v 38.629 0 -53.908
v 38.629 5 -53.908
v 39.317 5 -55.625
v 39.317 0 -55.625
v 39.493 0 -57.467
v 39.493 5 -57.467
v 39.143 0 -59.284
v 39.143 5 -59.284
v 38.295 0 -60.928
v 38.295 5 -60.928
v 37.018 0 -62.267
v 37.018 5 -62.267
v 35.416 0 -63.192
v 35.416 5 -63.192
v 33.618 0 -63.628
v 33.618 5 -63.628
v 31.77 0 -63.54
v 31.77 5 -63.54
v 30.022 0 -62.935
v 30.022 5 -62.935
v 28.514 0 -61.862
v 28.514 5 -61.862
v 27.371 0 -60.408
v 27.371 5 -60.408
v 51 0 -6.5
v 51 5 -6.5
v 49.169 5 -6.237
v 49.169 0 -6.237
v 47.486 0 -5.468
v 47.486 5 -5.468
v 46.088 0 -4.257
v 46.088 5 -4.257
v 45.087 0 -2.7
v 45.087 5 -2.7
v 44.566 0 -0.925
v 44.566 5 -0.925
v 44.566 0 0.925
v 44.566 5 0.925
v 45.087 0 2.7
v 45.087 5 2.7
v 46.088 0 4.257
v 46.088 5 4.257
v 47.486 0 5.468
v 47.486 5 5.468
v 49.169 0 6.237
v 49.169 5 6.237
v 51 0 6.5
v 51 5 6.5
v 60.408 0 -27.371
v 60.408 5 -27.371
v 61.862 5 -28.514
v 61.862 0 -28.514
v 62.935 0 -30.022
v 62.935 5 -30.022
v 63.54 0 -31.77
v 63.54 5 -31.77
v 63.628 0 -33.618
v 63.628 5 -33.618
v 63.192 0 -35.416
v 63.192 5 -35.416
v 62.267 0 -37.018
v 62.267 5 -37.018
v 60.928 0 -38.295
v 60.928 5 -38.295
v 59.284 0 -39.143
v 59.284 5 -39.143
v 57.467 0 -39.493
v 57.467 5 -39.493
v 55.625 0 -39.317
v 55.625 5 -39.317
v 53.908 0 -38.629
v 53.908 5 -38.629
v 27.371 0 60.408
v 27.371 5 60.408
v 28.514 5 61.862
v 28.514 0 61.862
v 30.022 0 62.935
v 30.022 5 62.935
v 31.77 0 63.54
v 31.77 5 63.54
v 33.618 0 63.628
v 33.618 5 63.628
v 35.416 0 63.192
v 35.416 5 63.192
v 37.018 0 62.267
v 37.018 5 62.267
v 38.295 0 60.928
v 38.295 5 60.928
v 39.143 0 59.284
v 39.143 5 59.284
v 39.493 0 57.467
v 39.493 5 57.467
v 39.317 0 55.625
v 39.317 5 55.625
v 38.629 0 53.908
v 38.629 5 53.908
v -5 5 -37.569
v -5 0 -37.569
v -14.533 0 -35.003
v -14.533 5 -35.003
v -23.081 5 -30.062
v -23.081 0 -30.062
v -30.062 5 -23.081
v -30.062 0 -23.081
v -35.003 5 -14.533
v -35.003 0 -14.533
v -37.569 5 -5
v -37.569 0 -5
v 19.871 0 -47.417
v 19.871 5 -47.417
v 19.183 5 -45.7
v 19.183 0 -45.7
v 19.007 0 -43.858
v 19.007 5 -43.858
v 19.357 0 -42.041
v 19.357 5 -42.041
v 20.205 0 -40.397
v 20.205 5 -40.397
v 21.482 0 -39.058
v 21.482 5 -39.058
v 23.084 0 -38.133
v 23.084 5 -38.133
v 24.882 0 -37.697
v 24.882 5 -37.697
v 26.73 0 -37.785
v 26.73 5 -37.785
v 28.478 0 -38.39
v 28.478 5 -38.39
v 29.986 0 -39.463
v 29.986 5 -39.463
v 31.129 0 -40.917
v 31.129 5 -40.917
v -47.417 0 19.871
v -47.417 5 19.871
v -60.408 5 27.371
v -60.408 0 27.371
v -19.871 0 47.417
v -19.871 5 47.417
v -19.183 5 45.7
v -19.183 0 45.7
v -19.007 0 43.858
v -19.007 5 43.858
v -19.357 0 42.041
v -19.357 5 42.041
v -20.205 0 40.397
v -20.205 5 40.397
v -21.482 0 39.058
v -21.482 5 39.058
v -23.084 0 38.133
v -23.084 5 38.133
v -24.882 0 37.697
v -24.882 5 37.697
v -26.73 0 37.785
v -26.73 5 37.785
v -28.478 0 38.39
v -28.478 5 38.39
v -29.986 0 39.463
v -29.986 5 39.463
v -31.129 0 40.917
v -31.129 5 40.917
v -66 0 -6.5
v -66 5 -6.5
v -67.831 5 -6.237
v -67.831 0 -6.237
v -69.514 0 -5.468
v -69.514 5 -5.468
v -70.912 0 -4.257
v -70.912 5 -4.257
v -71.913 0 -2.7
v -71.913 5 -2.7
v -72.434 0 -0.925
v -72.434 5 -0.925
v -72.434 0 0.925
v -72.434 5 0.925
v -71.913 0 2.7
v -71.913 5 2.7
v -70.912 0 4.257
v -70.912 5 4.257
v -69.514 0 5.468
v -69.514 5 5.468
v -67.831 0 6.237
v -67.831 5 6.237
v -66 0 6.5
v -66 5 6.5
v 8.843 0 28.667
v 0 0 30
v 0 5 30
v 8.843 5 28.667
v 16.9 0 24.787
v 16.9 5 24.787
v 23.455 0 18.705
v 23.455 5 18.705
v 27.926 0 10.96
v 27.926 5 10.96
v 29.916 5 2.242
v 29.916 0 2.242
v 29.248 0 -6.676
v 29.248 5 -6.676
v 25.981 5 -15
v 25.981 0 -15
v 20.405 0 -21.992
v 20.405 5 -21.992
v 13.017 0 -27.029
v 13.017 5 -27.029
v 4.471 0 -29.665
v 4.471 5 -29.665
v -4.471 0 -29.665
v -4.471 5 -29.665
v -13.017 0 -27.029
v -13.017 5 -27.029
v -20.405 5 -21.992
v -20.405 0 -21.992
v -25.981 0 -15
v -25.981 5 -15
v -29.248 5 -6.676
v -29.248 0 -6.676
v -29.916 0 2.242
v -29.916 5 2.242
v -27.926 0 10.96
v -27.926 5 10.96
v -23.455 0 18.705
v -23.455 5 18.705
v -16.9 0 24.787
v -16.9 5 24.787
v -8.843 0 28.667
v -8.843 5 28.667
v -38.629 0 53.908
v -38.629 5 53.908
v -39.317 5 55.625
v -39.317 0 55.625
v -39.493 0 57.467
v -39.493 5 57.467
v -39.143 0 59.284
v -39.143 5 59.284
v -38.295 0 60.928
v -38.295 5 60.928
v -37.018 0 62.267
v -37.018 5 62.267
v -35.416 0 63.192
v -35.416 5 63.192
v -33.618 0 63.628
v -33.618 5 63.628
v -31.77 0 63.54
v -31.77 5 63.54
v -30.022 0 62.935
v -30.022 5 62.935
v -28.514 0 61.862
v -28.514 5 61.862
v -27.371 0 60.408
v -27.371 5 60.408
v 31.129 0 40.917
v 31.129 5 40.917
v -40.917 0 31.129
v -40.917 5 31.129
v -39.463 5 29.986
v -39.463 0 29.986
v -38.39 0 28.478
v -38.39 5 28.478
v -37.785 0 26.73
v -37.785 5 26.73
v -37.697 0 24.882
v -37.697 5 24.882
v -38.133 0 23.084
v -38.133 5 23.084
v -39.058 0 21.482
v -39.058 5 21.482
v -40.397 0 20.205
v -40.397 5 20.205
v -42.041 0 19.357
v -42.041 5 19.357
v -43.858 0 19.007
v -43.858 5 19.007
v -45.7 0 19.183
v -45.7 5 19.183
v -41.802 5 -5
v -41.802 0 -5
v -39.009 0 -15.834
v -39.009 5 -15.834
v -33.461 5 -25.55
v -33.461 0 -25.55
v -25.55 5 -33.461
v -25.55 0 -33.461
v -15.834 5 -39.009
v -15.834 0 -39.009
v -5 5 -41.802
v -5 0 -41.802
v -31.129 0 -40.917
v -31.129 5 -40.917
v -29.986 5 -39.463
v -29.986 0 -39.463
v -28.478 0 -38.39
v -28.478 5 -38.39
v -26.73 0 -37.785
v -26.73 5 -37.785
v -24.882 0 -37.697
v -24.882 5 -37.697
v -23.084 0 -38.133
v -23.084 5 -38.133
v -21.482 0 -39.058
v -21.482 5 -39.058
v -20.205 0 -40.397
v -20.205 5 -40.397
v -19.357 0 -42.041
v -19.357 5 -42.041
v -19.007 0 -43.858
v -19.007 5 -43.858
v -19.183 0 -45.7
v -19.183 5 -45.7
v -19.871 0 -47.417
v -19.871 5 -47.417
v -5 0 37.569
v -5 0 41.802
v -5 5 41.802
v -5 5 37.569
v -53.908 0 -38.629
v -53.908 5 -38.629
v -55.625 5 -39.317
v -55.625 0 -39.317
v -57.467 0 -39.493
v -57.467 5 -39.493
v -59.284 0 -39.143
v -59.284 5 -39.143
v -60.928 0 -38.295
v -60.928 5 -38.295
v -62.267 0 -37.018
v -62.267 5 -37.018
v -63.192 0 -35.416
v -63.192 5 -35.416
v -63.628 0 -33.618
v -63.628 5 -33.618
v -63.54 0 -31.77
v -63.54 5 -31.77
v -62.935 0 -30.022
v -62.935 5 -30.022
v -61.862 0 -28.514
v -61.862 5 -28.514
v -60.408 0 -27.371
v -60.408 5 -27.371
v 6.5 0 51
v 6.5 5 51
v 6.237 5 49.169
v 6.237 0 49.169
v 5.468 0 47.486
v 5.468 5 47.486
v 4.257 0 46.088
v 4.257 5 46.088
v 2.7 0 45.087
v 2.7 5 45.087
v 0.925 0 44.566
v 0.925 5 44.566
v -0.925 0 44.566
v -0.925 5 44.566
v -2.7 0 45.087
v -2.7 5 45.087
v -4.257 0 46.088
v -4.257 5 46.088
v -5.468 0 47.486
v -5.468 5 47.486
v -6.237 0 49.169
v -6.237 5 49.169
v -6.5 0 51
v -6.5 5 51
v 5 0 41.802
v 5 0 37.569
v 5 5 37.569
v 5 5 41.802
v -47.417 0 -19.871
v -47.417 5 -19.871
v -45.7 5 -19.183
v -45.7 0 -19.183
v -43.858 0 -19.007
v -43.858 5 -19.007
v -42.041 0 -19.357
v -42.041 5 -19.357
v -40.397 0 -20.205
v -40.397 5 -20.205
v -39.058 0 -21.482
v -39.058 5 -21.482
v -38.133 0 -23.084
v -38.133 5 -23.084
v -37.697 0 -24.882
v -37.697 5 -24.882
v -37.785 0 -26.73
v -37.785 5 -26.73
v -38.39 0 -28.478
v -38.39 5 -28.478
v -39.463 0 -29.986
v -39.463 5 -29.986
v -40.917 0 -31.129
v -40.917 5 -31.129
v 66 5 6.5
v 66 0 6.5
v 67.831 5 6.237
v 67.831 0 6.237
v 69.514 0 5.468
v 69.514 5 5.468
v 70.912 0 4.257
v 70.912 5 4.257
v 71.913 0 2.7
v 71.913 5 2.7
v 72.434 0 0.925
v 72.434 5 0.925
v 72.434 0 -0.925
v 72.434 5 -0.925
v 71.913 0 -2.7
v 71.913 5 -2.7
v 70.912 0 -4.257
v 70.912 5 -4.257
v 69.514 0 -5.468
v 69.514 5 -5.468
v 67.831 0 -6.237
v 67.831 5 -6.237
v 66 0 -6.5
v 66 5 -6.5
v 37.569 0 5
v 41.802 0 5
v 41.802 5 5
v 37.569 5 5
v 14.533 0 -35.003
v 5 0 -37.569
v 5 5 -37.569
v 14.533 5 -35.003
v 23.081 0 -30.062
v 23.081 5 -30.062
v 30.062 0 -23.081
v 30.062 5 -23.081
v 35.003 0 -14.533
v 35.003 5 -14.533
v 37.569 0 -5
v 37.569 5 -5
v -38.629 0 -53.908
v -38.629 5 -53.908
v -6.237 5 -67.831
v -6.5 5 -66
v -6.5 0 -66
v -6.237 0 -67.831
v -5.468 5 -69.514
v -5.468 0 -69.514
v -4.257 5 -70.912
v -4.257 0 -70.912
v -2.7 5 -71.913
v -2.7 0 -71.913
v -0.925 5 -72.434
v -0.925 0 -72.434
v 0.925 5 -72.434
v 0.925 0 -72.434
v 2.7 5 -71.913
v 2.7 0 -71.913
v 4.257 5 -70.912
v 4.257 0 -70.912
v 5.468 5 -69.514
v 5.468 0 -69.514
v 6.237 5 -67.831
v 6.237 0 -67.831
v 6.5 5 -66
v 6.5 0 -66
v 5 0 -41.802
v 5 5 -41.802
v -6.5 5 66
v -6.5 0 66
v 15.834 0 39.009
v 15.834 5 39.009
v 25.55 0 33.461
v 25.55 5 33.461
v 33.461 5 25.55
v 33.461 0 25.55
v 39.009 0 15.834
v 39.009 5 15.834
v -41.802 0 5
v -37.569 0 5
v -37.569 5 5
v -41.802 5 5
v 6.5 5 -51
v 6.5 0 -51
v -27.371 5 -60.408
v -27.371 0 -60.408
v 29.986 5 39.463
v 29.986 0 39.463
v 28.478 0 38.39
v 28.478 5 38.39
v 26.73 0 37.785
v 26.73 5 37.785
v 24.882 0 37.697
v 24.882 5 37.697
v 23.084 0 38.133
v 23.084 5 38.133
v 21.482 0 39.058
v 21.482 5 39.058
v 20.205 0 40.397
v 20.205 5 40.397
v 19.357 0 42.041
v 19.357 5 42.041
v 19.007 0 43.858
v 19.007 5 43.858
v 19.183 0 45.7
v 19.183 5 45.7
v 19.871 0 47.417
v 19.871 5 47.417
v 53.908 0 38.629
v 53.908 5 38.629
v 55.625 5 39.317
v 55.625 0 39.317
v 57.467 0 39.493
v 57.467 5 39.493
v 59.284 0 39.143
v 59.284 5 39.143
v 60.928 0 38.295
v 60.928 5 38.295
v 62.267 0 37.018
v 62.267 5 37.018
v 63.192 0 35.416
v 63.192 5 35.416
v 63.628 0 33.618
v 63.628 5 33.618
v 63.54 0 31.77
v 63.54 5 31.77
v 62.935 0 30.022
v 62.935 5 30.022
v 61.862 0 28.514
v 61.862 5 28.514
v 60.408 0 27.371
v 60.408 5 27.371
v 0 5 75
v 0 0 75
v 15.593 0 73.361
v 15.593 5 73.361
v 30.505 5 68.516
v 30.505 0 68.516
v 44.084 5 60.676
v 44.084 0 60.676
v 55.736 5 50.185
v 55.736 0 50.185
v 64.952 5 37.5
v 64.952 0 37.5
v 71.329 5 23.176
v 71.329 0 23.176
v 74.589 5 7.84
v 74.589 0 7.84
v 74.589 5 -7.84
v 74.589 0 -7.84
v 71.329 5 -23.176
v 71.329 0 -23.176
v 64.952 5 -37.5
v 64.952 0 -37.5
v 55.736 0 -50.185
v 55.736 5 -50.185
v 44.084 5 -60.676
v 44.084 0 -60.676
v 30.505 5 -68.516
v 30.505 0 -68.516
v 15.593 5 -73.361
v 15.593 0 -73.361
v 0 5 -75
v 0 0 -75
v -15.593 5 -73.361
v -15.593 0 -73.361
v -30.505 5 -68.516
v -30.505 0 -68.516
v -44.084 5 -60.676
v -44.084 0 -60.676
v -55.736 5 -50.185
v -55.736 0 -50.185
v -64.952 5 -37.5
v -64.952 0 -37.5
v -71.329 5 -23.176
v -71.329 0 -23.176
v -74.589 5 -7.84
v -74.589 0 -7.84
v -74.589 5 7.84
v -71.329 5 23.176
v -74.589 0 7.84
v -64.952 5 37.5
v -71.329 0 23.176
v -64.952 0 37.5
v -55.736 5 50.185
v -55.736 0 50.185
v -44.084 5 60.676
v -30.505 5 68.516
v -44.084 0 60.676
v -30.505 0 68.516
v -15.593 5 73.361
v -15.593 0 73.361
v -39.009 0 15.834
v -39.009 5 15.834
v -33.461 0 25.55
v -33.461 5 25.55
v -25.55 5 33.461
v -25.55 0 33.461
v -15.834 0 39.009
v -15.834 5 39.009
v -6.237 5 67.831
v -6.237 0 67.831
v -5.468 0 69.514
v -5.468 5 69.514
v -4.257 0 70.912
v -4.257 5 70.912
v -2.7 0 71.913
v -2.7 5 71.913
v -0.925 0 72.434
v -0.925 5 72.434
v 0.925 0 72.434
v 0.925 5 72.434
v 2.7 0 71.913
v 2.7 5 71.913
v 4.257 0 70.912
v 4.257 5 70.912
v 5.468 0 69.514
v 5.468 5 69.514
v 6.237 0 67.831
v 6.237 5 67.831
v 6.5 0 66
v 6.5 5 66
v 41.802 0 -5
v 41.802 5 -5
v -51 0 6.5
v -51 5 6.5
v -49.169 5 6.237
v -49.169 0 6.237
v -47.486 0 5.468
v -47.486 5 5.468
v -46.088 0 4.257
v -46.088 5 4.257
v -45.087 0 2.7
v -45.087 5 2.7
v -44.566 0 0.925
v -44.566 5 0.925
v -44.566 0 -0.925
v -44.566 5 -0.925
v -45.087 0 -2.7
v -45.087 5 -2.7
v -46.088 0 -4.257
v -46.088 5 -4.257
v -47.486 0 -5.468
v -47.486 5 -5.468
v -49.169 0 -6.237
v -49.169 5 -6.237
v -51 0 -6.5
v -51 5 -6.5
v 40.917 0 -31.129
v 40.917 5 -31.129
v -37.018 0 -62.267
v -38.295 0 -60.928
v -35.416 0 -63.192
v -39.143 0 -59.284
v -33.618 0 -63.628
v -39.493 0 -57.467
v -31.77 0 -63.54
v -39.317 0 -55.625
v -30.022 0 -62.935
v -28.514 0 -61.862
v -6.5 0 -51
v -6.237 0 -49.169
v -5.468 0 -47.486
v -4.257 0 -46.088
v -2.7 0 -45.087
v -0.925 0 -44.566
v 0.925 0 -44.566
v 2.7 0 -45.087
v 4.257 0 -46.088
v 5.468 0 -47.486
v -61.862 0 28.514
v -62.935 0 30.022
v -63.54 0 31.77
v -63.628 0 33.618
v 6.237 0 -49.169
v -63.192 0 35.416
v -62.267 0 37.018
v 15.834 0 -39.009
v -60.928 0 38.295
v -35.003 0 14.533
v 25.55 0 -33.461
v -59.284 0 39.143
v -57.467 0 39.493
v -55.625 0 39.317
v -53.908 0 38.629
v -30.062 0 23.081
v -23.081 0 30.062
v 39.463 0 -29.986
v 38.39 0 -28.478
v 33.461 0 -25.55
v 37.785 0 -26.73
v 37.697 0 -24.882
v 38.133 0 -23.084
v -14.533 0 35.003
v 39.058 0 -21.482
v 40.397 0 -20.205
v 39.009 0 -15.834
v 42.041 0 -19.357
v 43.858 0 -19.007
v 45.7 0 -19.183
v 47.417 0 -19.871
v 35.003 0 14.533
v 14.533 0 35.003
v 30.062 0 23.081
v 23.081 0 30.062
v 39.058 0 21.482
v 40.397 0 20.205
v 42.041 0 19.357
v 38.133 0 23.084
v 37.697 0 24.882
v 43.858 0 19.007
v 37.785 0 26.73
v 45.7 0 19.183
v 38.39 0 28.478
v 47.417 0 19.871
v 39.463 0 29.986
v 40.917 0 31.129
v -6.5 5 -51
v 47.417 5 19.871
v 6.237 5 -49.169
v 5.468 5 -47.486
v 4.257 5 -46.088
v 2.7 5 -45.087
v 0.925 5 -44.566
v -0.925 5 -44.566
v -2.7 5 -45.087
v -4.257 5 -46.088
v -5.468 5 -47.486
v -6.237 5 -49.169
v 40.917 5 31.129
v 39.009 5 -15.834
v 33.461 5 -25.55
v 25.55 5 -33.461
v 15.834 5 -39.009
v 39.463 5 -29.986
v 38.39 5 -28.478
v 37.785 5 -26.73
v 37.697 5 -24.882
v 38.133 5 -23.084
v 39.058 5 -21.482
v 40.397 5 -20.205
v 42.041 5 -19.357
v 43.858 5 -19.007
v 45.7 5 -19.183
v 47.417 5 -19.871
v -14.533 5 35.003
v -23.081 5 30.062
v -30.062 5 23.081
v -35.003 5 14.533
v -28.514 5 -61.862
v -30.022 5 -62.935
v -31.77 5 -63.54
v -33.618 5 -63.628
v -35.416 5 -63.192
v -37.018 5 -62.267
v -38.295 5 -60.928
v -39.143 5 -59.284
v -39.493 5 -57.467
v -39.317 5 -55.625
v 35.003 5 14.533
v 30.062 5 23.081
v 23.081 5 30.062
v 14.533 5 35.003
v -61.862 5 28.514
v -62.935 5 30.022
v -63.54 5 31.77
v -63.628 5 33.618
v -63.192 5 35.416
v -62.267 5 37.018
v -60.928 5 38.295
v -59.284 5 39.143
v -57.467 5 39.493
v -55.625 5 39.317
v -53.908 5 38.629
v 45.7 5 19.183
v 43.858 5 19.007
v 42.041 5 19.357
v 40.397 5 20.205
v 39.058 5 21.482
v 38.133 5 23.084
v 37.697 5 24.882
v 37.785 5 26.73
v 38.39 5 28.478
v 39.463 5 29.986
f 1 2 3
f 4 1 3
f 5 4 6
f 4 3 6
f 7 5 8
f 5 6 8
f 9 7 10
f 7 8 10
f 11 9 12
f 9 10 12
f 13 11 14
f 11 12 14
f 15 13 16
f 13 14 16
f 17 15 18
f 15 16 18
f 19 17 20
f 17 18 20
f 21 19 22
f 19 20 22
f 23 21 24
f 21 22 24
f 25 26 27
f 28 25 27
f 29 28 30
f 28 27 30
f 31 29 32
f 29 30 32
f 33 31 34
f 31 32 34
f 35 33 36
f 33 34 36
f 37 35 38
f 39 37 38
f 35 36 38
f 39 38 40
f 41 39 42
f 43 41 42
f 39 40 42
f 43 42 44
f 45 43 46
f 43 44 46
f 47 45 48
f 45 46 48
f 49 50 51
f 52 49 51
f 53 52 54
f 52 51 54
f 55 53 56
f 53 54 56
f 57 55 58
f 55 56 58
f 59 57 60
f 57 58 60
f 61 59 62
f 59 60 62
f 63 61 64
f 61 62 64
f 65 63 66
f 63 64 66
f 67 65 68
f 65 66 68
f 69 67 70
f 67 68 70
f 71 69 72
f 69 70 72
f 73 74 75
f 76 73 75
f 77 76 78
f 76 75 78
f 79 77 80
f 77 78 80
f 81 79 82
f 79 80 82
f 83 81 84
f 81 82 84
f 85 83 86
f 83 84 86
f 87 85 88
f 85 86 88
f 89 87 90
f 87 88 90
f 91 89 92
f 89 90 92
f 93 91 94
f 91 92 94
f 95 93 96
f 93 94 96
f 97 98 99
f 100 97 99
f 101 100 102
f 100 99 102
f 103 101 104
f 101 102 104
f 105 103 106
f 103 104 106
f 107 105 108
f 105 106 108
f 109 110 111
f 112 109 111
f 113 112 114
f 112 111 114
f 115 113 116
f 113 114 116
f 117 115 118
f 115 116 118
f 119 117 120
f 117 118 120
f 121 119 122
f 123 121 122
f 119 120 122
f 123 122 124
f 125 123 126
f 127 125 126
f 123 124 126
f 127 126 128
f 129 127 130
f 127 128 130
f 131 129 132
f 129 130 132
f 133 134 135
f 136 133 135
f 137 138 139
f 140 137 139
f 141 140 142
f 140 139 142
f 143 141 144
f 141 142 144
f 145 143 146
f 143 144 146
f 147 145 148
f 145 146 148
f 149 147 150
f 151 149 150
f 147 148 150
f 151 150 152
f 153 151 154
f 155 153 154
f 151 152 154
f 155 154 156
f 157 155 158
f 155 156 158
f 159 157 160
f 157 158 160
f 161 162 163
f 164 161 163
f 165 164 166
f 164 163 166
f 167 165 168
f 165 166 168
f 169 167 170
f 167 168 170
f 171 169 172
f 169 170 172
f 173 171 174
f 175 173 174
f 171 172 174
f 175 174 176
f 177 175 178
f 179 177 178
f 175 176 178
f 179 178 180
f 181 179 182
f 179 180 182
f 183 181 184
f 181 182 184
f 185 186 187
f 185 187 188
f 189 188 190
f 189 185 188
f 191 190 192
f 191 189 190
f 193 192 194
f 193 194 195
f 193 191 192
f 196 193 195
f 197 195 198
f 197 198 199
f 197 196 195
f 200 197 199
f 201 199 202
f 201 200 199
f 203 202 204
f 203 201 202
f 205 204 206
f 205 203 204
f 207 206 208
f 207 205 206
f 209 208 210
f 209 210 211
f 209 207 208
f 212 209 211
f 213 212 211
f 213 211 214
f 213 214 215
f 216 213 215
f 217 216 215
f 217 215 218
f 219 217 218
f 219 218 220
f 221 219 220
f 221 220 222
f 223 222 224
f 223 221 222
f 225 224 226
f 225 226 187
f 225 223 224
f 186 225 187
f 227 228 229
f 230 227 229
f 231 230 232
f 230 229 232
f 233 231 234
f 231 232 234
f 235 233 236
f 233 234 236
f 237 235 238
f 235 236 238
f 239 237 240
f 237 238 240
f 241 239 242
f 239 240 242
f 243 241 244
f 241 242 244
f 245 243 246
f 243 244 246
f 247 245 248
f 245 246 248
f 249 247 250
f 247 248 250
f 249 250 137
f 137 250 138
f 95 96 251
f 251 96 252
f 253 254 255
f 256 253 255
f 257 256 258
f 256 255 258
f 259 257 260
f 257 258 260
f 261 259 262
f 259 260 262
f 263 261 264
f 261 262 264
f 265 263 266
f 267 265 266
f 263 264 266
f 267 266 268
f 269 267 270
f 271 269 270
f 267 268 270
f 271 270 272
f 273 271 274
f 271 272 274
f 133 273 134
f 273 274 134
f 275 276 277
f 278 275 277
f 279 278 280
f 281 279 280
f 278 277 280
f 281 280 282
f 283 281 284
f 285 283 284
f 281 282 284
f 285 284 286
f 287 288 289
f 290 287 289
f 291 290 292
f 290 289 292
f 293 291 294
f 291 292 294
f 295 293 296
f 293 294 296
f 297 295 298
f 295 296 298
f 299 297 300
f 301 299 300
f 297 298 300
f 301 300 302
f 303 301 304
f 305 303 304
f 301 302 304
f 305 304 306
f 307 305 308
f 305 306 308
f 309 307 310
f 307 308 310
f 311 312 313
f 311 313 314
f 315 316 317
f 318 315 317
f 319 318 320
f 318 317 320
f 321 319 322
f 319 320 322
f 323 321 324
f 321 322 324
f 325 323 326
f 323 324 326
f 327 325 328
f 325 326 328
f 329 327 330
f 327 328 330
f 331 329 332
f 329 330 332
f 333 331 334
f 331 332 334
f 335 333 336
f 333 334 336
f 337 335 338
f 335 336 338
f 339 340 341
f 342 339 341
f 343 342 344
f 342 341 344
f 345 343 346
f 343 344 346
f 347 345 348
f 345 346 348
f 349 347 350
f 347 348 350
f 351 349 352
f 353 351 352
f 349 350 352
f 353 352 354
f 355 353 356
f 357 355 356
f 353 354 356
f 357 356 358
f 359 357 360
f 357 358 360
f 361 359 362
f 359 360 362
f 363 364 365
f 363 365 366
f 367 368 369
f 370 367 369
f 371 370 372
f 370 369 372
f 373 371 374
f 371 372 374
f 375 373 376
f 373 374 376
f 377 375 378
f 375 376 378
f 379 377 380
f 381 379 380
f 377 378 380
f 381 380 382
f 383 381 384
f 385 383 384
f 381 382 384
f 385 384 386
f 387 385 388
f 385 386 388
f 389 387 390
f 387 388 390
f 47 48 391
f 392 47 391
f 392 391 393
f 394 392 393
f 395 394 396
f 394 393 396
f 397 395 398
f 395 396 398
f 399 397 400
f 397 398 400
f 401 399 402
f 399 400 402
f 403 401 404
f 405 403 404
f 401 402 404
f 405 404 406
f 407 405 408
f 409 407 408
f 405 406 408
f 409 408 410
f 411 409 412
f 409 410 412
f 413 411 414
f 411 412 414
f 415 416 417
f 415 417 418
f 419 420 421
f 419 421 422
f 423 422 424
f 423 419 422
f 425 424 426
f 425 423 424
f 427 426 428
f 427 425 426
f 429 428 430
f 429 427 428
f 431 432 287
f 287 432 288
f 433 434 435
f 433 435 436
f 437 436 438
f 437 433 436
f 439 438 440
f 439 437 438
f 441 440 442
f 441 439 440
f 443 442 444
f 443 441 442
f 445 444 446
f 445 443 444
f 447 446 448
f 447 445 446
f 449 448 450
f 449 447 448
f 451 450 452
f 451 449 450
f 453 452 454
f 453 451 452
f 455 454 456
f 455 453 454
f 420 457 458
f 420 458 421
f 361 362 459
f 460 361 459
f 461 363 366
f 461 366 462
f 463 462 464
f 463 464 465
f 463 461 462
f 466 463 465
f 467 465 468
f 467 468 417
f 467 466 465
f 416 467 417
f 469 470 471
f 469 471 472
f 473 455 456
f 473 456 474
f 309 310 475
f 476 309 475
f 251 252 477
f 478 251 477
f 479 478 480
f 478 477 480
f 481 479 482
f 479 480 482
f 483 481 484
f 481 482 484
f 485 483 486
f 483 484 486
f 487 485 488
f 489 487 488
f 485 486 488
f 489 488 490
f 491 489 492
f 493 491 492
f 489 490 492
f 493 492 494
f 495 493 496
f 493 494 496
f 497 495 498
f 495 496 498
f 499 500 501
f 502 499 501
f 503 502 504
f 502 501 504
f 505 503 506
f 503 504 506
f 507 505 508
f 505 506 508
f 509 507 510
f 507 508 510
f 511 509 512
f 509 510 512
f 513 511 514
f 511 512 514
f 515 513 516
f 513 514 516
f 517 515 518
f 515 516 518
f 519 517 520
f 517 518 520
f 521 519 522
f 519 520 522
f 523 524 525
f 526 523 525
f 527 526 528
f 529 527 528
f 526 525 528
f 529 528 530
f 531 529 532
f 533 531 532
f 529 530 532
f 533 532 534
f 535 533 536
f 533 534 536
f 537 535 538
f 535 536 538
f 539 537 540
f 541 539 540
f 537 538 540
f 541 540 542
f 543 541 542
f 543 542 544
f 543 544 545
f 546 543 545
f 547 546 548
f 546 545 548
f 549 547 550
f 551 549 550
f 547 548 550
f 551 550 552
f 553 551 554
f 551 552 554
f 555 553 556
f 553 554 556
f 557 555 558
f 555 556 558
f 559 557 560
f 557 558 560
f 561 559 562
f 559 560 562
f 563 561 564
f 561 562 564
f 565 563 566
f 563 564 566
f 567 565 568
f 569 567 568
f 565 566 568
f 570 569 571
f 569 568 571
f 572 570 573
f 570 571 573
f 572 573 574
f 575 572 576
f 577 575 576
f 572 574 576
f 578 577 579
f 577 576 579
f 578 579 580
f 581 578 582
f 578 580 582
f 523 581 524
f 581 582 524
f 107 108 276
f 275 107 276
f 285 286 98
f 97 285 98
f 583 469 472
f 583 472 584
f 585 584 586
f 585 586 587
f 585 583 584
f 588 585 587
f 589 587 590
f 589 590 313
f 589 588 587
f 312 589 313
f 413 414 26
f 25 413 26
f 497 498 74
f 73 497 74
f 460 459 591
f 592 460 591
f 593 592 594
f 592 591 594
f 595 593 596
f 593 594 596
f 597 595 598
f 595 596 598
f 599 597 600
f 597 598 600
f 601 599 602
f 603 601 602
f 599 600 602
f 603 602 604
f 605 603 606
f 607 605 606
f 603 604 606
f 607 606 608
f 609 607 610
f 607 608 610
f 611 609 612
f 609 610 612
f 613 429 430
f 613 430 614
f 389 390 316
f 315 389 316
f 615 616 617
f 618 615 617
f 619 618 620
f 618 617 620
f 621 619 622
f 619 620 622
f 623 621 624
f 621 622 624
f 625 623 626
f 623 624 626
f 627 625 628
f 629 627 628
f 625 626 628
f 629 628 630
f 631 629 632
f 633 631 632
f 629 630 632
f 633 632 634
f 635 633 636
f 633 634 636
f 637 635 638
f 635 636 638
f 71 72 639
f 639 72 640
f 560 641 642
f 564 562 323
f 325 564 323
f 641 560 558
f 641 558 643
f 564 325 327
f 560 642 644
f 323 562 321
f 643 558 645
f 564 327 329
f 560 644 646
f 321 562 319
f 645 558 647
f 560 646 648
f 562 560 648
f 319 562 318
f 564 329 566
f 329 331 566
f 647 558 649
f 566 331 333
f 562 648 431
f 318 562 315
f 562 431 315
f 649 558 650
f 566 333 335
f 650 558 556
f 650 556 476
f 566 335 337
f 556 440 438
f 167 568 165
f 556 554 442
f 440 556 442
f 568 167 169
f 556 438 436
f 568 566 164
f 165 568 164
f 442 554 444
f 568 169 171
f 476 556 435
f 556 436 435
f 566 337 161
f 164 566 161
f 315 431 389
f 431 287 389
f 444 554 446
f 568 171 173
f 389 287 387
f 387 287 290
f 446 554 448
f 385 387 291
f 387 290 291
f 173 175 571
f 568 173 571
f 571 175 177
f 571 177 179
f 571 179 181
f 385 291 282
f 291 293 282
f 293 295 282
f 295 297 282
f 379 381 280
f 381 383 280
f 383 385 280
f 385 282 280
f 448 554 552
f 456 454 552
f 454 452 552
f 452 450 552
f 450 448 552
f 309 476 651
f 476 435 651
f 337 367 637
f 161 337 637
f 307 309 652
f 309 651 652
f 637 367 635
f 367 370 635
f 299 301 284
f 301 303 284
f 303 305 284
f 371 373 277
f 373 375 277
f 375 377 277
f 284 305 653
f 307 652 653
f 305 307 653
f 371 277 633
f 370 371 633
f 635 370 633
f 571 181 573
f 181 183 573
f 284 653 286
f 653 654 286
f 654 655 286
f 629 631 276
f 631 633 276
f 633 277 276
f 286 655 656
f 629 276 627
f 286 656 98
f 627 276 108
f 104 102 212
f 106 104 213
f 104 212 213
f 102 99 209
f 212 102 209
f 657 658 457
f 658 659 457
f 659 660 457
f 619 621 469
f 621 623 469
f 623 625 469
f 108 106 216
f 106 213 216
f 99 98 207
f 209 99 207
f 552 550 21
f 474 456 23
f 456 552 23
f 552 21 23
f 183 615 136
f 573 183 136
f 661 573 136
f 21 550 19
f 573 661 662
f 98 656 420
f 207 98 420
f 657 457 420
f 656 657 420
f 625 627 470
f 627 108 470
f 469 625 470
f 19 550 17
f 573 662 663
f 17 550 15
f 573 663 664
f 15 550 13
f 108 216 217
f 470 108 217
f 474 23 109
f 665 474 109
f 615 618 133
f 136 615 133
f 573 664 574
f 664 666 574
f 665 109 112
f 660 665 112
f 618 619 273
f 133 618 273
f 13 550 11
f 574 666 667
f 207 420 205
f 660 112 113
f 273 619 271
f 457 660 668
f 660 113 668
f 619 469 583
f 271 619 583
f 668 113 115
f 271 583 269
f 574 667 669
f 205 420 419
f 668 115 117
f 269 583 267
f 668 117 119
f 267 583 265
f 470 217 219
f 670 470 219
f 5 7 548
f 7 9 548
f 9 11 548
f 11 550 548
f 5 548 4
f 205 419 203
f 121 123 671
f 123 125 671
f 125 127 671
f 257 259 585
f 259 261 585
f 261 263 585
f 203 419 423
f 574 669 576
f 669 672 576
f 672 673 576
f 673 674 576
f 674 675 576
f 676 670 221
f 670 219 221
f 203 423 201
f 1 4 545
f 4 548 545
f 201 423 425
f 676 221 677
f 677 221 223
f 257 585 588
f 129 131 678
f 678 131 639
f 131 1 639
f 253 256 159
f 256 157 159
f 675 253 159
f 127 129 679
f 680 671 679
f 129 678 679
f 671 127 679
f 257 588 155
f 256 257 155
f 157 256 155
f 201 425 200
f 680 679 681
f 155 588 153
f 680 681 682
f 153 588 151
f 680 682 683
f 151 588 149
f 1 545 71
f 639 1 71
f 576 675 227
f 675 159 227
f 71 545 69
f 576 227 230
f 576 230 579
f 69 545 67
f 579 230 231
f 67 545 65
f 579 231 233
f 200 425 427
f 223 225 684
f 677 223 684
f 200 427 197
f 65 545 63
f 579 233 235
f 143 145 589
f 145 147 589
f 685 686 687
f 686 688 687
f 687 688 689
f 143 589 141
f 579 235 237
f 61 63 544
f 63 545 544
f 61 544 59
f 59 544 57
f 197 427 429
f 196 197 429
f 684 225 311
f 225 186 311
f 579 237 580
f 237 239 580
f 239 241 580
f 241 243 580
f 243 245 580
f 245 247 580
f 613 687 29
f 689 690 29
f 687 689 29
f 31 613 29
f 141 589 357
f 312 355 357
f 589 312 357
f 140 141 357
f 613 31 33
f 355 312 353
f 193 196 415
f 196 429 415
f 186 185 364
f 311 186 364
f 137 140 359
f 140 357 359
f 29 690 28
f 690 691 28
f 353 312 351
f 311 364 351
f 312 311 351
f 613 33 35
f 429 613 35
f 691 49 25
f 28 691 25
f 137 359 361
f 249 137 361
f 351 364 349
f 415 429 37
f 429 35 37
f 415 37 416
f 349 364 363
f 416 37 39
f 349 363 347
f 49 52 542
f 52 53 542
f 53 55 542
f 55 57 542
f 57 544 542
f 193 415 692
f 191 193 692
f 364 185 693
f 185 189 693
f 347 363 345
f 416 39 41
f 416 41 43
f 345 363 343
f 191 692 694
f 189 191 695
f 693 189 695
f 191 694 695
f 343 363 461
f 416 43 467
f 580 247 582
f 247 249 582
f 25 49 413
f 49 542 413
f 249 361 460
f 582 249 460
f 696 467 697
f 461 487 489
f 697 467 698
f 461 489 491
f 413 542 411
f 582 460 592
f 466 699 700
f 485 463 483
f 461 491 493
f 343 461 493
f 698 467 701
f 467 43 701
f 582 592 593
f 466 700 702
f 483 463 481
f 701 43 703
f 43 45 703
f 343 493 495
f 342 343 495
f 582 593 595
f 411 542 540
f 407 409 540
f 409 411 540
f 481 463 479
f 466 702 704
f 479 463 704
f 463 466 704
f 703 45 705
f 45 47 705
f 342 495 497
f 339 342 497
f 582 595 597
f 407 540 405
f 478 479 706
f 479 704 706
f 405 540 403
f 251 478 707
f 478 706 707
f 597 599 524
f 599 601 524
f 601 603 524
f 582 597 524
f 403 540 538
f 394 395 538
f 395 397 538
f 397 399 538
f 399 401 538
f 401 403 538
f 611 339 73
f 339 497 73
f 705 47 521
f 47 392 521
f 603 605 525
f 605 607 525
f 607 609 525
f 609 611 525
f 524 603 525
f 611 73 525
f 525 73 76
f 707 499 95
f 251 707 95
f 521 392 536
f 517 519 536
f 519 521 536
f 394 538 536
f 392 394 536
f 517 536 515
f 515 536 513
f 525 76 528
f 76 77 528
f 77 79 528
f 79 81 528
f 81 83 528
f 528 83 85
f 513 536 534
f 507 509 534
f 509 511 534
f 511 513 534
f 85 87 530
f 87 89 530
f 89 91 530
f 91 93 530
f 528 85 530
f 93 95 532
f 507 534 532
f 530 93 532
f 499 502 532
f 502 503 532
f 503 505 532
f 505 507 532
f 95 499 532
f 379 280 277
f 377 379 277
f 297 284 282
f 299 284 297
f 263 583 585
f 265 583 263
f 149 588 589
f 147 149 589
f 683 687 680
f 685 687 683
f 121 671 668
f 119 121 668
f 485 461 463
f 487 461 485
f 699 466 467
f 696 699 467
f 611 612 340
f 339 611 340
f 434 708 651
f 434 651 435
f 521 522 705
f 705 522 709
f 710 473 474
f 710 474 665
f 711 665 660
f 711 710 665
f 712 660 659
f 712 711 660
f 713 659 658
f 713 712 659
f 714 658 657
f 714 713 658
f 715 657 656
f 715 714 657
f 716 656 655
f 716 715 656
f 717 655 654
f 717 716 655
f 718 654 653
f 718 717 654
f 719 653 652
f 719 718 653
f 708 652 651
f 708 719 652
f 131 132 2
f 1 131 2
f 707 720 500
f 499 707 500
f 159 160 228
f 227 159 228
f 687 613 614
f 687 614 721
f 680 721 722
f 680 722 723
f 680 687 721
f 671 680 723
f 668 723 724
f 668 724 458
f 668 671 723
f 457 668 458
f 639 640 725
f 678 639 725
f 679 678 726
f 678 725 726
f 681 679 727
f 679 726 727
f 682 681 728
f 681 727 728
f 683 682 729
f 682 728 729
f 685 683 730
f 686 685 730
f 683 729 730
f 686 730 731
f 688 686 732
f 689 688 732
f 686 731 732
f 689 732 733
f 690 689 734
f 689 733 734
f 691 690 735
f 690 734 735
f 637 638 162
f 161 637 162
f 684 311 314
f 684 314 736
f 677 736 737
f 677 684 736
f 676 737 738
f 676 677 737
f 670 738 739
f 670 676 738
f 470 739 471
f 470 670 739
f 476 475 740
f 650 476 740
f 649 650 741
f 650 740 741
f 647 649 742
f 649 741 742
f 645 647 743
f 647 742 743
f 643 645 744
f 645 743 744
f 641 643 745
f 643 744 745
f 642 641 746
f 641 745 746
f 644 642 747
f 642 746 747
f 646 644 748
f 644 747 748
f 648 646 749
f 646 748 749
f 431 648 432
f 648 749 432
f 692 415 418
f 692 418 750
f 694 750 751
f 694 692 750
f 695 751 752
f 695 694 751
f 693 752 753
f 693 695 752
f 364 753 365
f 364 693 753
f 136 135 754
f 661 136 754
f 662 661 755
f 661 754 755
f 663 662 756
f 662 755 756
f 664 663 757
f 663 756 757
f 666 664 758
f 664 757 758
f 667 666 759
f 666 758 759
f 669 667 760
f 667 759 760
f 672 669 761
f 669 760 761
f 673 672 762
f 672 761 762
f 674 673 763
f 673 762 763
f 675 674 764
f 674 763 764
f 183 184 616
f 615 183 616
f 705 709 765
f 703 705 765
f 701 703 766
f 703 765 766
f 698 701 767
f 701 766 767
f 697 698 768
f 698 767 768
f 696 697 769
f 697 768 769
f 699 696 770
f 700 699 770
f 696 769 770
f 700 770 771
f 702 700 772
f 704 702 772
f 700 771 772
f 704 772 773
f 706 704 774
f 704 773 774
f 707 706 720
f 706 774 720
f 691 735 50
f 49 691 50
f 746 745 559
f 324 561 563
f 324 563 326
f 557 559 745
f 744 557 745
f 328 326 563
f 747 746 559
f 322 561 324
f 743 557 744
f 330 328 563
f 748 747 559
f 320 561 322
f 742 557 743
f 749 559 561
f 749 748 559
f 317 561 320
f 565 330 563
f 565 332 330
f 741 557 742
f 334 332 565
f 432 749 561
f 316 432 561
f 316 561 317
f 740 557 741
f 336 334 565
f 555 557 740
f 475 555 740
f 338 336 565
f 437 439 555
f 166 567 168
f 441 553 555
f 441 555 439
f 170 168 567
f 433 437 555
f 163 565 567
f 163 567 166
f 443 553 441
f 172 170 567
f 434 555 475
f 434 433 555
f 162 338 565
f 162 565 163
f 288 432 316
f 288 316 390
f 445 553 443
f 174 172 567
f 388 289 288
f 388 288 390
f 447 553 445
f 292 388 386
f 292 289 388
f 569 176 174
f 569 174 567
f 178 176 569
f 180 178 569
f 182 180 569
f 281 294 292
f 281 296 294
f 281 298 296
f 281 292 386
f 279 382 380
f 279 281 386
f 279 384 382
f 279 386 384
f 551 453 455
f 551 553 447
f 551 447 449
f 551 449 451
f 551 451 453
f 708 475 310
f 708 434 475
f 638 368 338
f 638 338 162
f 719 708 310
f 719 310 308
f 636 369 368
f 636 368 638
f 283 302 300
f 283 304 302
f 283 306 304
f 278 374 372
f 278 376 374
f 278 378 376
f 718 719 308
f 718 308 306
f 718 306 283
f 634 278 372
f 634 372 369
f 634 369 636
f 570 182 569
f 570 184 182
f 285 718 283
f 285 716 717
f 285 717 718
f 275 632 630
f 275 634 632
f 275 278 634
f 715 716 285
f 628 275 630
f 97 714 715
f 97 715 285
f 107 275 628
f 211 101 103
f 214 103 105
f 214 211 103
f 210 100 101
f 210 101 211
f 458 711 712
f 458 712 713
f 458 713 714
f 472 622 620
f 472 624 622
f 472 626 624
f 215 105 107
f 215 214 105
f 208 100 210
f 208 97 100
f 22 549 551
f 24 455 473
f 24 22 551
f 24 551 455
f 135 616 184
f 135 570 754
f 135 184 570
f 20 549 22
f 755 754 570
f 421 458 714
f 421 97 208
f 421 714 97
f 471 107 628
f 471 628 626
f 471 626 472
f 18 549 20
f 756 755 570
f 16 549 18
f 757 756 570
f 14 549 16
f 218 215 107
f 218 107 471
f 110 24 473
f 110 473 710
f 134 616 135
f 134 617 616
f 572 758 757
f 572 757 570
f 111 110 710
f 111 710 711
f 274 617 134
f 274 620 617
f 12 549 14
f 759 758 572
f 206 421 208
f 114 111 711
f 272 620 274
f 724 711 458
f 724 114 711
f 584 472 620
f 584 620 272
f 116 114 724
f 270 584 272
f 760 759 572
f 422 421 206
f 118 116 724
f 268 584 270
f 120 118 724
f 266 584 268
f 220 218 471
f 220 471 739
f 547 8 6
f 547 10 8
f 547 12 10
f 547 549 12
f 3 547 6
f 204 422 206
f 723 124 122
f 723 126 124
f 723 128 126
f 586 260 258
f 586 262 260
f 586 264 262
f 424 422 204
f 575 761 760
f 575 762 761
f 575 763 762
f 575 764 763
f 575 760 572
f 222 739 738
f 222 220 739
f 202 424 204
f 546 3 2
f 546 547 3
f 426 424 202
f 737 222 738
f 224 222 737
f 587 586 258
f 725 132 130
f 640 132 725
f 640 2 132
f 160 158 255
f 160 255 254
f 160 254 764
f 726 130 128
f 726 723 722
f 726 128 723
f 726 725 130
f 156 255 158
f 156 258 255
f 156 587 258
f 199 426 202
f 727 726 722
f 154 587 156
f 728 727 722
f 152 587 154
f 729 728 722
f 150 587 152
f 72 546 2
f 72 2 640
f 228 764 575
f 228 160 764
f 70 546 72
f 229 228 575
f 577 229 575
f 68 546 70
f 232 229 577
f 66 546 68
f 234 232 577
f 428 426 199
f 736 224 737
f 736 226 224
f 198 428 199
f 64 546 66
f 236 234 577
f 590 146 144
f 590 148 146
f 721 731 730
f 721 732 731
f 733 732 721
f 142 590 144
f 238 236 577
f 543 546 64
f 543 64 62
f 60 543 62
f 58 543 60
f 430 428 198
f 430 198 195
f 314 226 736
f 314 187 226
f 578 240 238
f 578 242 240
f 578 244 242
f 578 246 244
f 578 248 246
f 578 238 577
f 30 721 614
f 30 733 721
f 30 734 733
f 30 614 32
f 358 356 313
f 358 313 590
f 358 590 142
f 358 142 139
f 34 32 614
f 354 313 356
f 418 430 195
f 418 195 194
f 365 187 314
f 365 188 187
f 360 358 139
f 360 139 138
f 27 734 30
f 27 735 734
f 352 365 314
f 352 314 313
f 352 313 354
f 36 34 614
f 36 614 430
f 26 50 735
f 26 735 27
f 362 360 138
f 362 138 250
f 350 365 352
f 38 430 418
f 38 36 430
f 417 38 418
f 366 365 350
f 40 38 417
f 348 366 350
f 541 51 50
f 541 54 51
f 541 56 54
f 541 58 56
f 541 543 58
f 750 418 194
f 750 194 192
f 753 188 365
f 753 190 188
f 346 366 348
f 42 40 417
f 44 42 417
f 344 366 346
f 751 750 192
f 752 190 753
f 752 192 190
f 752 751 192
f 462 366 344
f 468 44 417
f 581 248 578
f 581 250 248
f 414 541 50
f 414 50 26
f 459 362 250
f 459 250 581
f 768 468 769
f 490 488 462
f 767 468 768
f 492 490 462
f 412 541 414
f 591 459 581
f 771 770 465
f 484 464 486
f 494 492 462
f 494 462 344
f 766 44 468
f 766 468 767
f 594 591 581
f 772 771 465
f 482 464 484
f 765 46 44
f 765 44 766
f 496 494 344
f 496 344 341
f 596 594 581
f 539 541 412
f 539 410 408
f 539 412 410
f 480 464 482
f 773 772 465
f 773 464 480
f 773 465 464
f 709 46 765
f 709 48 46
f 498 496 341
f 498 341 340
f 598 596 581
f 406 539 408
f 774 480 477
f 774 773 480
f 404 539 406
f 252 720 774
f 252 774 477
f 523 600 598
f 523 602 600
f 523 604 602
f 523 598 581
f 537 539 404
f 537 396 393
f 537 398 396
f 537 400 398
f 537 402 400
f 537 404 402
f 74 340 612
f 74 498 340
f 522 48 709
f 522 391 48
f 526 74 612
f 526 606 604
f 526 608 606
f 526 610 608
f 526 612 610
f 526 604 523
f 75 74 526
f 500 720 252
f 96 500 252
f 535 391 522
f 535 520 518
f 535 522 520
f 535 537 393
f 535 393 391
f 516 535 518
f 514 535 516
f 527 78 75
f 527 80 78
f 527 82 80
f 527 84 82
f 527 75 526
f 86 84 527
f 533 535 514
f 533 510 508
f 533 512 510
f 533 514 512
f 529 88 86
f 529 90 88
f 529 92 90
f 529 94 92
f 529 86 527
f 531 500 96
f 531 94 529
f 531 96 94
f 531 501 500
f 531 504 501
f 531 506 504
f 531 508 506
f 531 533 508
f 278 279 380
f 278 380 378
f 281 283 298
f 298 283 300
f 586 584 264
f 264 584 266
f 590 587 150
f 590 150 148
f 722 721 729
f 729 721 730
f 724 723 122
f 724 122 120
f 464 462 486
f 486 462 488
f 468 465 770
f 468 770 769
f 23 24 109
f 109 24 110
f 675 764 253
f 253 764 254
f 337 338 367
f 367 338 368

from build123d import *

# Parameters (mm, degrees)
SKETCH1_R           = 75
SKETCH1_R_2         = 30
BOSS_EXTRUDE1_DEPTH = 5
CUT_EXTRUDE1_DEPTH  = 107.183802908


with BuildPart() as part:
    # Sketch1 → Boss-Extrude1 (new body)
    with BuildSketch(Plane(origin=(0, 0, 0), x_dir=(1, 0, 0), z_dir=(0, 1, 0))):
        with Locations(Location((0, 0, 0), (0, 0, 270))):
            Circle(SKETCH1_R)
        with Locations(Location((0, 0, 0), (0, 0, 270))):
            Circle(SKETCH1_R_2, mode=Mode.SUBTRACT)
        with BuildLine():
            Line((-5, 41.802033443), (-5, 37.568737003))
            ThreePointArc((-5, 37.568737003), (-26.799347007, 26.799347007), (-37.568737003, 5))
            Line((-37.568737003, 5), (-41.802033443, 5))
            ThreePointArc((-41.802033443, 5), (-29.769195488, 29.769195488), (-5, 41.802033443))
        make_face(mode=Mode.SUBTRACT)
        with BuildLine():
            Line((5, 41.802033443), (5, 37.568737003))
            ThreePointArc((5, 37.568737003), (26.799347007, 26.799347007), (37.568737003, 5))
            Line((37.568737003, 5), (41.802033443, 5))
            ThreePointArc((41.802033443, 5), (29.769195488, 29.769195488), (5, 41.802033443))
        make_face(mode=Mode.SUBTRACT)
        with BuildLine():
            Line((41.802033443, -5), (37.568737003, -5))
            ThreePointArc((37.568737003, -5), (26.799347007, -26.799347007), (5, -37.568737003))
            Line((5, -37.568737003), (5, -41.802033443))
            ThreePointArc((5, -41.802033443), (29.769195488, -29.769195488), (41.802033443, -5))
        make_face(mode=Mode.SUBTRACT)
        with BuildLine():
            Line((-5, -41.802033443), (-5, -37.568737003))
            ThreePointArc((-5, -37.568737003), (-26.799347007, -26.799347007), (-37.568737003, -5))
            Line((-37.568737003, -5), (-41.802033443, -5))
            ThreePointArc((-41.802033443, -5), (-29.769195488, -29.769195488), (-5, -41.802033443))
        make_face(mode=Mode.SUBTRACT)
    extrude(amount=BOSS_EXTRUDE1_DEPTH)

    # Sketch4 → Cut-Extrude1 (cut, through all)
    with BuildSketch(Plane(origin=(0, 5, 0), x_dir=(1, 0, 0), z_dir=(0, 1, 0))):
        with BuildLine():
            Line((-6.5, 51), (-6.5, 66))
            ThreePointArc((-6.5, 66), (0, 72.5), (6.5, 66))
            Line((6.5, 66), (6.5, 51))
            ThreePointArc((6.5, 51), (0, 44.5), (-6.5, 51))
        make_face()
        with BuildLine():
            Line((31.129165125, 40.917295593), (38.629165125, 53.90767665))
            ThreePointArc((38.629165125, 53.90767665), (36.25, 62.786841774), (27.370834875, 60.40767665))
            Line((27.370834875, 60.40767665), (19.870834875, 47.417295593))
            ThreePointArc((19.870834875, 47.417295593), (22.25, 38.538130468), (31.129165125, 40.917295593))
        make_face()
        with BuildLine():
            Line((47.417295593, 19.870834875), (60.40767665, 27.370834875))
            ThreePointArc((60.40767665, 27.370834875), (62.786841774, 36.25), (53.90767665, 38.629165125))
            Line((53.90767665, 38.629165125), (40.917295593, 31.129165125))
            ThreePointArc((40.917295593, 31.129165125), (38.538130468, 22.25), (47.417295593, 19.870834875))
        make_face()
        with BuildLine():
            Line((51, -6.5), (66, -6.5))
            ThreePointArc((66, -6.5), (72.5, 0), (66, 6.5))
            Line((66, 6.5), (51, 6.5))
            ThreePointArc((51, 6.5), (44.5, 0), (51, -6.5))
        make_face()
        with BuildLine():
            Line((40.917295593, -31.129165125), (53.90767665, -38.629165125))
            ThreePointArc((53.90767665, -38.629165125), (62.786841774, -36.25), (60.40767665, -27.370834875))
            Line((60.40767665, -27.370834875), (47.417295593, -19.870834875))
            ThreePointArc((47.417295593, -19.870834875), (38.538130468, -22.25), (40.917295593, -31.129165125))
        make_face()
        with BuildLine():
            Line((19.870834875, -47.417295593), (27.370834875, -60.40767665))
            ThreePointArc((27.370834875, -60.40767665), (36.25, -62.786841774), (38.629165125, -53.90767665))
            Line((38.629165125, -53.90767665), (31.129165125, -40.917295593))
            ThreePointArc((31.129165125, -40.917295593), (22.25, -38.538130468), (19.870834875, -47.417295593))
        make_face()
        with BuildLine():
            Line((-6.5, -51), (-6.5, -66))
            ThreePointArc((-6.5, -66), (0, -72.5), (6.5, -66))
            Line((6.5, -66), (6.5, -51))
            ThreePointArc((6.5, -51), (0, -44.5), (-6.5, -51))
        make_face()
        with BuildLine():
            Line((-31.129165125, -40.917295593), (-38.629165125, -53.90767665))
            ThreePointArc((-38.629165125, -53.90767665), (-36.25, -62.786841774), (-27.370834875, -60.40767665))
            Line((-27.370834875, -60.40767665), (-19.870834875, -47.417295593))
            ThreePointArc((-19.870834875, -47.417295593), (-22.25, -38.538130468), (-31.129165125, -40.917295593))
        make_face()
        with BuildLine():
            Line((-47.417295593, -19.870834875), (-60.40767665, -27.370834875))
            ThreePointArc((-60.40767665, -27.370834875), (-62.786841774, -36.25), (-53.90767665, -38.629165125))
            Line((-53.90767665, -38.629165125), (-40.917295593, -31.129165125))
            ThreePointArc((-40.917295593, -31.129165125), (-38.538130468, -22.25), (-47.417295593, -19.870834875))
        make_face()
        with BuildLine():
            Line((-51, 6.5), (-66, 6.5))
            ThreePointArc((-66, 6.5), (-72.5, 0), (-66, -6.5))
            Line((-66, -6.5), (-51, -6.5))
            ThreePointArc((-51, -6.5), (-44.5, 0), (-51, 6.5))
        make_face()
        with BuildLine():
            Line((-40.917295593, 31.129165125), (-53.90767665, 38.629165125))
            ThreePointArc((-53.90767665, 38.629165125), (-62.786841774, 36.25), (-60.40767665, 27.370834875))
            Line((-60.40767665, 27.370834875), (-47.417295593, 19.870834875))
            ThreePointArc((-47.417295593, 19.870834875), (-38.538130468, 22.25), (-40.917295593, 31.129165125))
        make_face()
        with BuildLine():
            Line((-19.870834875, 47.417295593), (-27.370834875, 60.40767665))
            ThreePointArc((-27.370834875, 60.40767665), (-36.25, 62.786841774), (-38.629165125, 53.90767665))
            Line((-38.629165125, 53.90767665), (-31.129165125, 40.917295593))
            ThreePointArc((-31.129165125, 40.917295593), (-22.25, 38.538130468), (-19.870834875, 47.417295593))
        make_face()
    extrude(amount=-CUT_EXTRUDE1_DEPTH, mode=Mode.SUBTRACT)


solid = part.part
